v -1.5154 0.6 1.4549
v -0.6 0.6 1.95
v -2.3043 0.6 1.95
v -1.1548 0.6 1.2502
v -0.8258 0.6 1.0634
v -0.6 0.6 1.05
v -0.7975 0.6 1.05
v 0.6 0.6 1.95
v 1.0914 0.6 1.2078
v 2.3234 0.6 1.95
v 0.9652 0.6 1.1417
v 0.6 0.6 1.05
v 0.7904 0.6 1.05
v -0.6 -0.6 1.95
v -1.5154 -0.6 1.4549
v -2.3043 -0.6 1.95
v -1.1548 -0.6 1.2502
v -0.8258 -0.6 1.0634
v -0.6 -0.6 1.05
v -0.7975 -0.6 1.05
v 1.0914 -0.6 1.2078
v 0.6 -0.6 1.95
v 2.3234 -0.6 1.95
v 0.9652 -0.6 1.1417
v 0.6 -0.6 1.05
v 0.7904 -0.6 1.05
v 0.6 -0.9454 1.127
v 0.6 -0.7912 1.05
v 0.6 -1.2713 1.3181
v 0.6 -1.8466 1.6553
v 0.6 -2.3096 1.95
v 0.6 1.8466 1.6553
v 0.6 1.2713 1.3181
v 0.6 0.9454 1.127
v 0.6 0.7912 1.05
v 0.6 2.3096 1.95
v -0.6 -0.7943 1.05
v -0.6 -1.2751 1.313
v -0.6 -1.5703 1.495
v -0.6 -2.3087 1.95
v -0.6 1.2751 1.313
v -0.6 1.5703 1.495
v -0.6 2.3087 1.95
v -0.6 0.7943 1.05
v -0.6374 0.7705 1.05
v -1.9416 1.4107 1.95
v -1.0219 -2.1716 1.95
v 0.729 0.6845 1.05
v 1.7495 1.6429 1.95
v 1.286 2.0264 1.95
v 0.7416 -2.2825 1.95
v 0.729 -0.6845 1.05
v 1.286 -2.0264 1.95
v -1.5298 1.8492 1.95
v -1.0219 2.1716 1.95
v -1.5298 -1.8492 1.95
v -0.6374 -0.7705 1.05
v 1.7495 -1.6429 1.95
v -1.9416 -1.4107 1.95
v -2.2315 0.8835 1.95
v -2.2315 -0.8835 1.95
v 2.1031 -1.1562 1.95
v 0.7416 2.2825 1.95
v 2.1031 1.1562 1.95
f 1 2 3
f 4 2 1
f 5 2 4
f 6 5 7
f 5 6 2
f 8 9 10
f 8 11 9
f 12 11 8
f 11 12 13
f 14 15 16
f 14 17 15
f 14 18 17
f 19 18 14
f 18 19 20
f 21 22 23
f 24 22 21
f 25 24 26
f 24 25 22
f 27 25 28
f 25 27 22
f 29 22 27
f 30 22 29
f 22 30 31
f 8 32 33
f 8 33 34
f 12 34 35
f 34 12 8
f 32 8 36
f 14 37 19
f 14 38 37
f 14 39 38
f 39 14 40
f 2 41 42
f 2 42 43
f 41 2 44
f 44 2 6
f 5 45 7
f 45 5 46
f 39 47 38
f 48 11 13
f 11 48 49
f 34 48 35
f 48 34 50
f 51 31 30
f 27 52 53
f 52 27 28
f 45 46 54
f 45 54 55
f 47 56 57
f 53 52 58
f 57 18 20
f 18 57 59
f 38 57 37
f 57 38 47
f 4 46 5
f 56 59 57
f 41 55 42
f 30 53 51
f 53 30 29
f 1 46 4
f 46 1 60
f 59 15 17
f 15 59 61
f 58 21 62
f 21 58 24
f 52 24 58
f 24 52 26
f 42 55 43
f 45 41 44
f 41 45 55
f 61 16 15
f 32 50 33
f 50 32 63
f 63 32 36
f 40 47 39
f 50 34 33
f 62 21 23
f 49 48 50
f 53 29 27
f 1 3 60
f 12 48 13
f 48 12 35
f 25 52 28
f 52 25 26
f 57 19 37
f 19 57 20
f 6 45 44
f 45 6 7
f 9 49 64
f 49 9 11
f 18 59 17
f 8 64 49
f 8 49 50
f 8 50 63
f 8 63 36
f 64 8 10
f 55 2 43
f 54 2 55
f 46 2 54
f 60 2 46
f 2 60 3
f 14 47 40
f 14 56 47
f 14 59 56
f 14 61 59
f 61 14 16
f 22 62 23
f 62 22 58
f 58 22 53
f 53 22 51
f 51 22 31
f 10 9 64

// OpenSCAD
alt = 2;
larg=4.8;
comp=1.2;

difference(){

 translate([0,0,1.05]) cylinder(h=0.90, r1=1, r2=2.4, center=false,$fn=25);
union(){translate([-2.4,-.6,1]) cube([larg,comp,alt-1]);
translate([-.6,-2.4,1]) cube([comp,larg,alt-1]);}


}
